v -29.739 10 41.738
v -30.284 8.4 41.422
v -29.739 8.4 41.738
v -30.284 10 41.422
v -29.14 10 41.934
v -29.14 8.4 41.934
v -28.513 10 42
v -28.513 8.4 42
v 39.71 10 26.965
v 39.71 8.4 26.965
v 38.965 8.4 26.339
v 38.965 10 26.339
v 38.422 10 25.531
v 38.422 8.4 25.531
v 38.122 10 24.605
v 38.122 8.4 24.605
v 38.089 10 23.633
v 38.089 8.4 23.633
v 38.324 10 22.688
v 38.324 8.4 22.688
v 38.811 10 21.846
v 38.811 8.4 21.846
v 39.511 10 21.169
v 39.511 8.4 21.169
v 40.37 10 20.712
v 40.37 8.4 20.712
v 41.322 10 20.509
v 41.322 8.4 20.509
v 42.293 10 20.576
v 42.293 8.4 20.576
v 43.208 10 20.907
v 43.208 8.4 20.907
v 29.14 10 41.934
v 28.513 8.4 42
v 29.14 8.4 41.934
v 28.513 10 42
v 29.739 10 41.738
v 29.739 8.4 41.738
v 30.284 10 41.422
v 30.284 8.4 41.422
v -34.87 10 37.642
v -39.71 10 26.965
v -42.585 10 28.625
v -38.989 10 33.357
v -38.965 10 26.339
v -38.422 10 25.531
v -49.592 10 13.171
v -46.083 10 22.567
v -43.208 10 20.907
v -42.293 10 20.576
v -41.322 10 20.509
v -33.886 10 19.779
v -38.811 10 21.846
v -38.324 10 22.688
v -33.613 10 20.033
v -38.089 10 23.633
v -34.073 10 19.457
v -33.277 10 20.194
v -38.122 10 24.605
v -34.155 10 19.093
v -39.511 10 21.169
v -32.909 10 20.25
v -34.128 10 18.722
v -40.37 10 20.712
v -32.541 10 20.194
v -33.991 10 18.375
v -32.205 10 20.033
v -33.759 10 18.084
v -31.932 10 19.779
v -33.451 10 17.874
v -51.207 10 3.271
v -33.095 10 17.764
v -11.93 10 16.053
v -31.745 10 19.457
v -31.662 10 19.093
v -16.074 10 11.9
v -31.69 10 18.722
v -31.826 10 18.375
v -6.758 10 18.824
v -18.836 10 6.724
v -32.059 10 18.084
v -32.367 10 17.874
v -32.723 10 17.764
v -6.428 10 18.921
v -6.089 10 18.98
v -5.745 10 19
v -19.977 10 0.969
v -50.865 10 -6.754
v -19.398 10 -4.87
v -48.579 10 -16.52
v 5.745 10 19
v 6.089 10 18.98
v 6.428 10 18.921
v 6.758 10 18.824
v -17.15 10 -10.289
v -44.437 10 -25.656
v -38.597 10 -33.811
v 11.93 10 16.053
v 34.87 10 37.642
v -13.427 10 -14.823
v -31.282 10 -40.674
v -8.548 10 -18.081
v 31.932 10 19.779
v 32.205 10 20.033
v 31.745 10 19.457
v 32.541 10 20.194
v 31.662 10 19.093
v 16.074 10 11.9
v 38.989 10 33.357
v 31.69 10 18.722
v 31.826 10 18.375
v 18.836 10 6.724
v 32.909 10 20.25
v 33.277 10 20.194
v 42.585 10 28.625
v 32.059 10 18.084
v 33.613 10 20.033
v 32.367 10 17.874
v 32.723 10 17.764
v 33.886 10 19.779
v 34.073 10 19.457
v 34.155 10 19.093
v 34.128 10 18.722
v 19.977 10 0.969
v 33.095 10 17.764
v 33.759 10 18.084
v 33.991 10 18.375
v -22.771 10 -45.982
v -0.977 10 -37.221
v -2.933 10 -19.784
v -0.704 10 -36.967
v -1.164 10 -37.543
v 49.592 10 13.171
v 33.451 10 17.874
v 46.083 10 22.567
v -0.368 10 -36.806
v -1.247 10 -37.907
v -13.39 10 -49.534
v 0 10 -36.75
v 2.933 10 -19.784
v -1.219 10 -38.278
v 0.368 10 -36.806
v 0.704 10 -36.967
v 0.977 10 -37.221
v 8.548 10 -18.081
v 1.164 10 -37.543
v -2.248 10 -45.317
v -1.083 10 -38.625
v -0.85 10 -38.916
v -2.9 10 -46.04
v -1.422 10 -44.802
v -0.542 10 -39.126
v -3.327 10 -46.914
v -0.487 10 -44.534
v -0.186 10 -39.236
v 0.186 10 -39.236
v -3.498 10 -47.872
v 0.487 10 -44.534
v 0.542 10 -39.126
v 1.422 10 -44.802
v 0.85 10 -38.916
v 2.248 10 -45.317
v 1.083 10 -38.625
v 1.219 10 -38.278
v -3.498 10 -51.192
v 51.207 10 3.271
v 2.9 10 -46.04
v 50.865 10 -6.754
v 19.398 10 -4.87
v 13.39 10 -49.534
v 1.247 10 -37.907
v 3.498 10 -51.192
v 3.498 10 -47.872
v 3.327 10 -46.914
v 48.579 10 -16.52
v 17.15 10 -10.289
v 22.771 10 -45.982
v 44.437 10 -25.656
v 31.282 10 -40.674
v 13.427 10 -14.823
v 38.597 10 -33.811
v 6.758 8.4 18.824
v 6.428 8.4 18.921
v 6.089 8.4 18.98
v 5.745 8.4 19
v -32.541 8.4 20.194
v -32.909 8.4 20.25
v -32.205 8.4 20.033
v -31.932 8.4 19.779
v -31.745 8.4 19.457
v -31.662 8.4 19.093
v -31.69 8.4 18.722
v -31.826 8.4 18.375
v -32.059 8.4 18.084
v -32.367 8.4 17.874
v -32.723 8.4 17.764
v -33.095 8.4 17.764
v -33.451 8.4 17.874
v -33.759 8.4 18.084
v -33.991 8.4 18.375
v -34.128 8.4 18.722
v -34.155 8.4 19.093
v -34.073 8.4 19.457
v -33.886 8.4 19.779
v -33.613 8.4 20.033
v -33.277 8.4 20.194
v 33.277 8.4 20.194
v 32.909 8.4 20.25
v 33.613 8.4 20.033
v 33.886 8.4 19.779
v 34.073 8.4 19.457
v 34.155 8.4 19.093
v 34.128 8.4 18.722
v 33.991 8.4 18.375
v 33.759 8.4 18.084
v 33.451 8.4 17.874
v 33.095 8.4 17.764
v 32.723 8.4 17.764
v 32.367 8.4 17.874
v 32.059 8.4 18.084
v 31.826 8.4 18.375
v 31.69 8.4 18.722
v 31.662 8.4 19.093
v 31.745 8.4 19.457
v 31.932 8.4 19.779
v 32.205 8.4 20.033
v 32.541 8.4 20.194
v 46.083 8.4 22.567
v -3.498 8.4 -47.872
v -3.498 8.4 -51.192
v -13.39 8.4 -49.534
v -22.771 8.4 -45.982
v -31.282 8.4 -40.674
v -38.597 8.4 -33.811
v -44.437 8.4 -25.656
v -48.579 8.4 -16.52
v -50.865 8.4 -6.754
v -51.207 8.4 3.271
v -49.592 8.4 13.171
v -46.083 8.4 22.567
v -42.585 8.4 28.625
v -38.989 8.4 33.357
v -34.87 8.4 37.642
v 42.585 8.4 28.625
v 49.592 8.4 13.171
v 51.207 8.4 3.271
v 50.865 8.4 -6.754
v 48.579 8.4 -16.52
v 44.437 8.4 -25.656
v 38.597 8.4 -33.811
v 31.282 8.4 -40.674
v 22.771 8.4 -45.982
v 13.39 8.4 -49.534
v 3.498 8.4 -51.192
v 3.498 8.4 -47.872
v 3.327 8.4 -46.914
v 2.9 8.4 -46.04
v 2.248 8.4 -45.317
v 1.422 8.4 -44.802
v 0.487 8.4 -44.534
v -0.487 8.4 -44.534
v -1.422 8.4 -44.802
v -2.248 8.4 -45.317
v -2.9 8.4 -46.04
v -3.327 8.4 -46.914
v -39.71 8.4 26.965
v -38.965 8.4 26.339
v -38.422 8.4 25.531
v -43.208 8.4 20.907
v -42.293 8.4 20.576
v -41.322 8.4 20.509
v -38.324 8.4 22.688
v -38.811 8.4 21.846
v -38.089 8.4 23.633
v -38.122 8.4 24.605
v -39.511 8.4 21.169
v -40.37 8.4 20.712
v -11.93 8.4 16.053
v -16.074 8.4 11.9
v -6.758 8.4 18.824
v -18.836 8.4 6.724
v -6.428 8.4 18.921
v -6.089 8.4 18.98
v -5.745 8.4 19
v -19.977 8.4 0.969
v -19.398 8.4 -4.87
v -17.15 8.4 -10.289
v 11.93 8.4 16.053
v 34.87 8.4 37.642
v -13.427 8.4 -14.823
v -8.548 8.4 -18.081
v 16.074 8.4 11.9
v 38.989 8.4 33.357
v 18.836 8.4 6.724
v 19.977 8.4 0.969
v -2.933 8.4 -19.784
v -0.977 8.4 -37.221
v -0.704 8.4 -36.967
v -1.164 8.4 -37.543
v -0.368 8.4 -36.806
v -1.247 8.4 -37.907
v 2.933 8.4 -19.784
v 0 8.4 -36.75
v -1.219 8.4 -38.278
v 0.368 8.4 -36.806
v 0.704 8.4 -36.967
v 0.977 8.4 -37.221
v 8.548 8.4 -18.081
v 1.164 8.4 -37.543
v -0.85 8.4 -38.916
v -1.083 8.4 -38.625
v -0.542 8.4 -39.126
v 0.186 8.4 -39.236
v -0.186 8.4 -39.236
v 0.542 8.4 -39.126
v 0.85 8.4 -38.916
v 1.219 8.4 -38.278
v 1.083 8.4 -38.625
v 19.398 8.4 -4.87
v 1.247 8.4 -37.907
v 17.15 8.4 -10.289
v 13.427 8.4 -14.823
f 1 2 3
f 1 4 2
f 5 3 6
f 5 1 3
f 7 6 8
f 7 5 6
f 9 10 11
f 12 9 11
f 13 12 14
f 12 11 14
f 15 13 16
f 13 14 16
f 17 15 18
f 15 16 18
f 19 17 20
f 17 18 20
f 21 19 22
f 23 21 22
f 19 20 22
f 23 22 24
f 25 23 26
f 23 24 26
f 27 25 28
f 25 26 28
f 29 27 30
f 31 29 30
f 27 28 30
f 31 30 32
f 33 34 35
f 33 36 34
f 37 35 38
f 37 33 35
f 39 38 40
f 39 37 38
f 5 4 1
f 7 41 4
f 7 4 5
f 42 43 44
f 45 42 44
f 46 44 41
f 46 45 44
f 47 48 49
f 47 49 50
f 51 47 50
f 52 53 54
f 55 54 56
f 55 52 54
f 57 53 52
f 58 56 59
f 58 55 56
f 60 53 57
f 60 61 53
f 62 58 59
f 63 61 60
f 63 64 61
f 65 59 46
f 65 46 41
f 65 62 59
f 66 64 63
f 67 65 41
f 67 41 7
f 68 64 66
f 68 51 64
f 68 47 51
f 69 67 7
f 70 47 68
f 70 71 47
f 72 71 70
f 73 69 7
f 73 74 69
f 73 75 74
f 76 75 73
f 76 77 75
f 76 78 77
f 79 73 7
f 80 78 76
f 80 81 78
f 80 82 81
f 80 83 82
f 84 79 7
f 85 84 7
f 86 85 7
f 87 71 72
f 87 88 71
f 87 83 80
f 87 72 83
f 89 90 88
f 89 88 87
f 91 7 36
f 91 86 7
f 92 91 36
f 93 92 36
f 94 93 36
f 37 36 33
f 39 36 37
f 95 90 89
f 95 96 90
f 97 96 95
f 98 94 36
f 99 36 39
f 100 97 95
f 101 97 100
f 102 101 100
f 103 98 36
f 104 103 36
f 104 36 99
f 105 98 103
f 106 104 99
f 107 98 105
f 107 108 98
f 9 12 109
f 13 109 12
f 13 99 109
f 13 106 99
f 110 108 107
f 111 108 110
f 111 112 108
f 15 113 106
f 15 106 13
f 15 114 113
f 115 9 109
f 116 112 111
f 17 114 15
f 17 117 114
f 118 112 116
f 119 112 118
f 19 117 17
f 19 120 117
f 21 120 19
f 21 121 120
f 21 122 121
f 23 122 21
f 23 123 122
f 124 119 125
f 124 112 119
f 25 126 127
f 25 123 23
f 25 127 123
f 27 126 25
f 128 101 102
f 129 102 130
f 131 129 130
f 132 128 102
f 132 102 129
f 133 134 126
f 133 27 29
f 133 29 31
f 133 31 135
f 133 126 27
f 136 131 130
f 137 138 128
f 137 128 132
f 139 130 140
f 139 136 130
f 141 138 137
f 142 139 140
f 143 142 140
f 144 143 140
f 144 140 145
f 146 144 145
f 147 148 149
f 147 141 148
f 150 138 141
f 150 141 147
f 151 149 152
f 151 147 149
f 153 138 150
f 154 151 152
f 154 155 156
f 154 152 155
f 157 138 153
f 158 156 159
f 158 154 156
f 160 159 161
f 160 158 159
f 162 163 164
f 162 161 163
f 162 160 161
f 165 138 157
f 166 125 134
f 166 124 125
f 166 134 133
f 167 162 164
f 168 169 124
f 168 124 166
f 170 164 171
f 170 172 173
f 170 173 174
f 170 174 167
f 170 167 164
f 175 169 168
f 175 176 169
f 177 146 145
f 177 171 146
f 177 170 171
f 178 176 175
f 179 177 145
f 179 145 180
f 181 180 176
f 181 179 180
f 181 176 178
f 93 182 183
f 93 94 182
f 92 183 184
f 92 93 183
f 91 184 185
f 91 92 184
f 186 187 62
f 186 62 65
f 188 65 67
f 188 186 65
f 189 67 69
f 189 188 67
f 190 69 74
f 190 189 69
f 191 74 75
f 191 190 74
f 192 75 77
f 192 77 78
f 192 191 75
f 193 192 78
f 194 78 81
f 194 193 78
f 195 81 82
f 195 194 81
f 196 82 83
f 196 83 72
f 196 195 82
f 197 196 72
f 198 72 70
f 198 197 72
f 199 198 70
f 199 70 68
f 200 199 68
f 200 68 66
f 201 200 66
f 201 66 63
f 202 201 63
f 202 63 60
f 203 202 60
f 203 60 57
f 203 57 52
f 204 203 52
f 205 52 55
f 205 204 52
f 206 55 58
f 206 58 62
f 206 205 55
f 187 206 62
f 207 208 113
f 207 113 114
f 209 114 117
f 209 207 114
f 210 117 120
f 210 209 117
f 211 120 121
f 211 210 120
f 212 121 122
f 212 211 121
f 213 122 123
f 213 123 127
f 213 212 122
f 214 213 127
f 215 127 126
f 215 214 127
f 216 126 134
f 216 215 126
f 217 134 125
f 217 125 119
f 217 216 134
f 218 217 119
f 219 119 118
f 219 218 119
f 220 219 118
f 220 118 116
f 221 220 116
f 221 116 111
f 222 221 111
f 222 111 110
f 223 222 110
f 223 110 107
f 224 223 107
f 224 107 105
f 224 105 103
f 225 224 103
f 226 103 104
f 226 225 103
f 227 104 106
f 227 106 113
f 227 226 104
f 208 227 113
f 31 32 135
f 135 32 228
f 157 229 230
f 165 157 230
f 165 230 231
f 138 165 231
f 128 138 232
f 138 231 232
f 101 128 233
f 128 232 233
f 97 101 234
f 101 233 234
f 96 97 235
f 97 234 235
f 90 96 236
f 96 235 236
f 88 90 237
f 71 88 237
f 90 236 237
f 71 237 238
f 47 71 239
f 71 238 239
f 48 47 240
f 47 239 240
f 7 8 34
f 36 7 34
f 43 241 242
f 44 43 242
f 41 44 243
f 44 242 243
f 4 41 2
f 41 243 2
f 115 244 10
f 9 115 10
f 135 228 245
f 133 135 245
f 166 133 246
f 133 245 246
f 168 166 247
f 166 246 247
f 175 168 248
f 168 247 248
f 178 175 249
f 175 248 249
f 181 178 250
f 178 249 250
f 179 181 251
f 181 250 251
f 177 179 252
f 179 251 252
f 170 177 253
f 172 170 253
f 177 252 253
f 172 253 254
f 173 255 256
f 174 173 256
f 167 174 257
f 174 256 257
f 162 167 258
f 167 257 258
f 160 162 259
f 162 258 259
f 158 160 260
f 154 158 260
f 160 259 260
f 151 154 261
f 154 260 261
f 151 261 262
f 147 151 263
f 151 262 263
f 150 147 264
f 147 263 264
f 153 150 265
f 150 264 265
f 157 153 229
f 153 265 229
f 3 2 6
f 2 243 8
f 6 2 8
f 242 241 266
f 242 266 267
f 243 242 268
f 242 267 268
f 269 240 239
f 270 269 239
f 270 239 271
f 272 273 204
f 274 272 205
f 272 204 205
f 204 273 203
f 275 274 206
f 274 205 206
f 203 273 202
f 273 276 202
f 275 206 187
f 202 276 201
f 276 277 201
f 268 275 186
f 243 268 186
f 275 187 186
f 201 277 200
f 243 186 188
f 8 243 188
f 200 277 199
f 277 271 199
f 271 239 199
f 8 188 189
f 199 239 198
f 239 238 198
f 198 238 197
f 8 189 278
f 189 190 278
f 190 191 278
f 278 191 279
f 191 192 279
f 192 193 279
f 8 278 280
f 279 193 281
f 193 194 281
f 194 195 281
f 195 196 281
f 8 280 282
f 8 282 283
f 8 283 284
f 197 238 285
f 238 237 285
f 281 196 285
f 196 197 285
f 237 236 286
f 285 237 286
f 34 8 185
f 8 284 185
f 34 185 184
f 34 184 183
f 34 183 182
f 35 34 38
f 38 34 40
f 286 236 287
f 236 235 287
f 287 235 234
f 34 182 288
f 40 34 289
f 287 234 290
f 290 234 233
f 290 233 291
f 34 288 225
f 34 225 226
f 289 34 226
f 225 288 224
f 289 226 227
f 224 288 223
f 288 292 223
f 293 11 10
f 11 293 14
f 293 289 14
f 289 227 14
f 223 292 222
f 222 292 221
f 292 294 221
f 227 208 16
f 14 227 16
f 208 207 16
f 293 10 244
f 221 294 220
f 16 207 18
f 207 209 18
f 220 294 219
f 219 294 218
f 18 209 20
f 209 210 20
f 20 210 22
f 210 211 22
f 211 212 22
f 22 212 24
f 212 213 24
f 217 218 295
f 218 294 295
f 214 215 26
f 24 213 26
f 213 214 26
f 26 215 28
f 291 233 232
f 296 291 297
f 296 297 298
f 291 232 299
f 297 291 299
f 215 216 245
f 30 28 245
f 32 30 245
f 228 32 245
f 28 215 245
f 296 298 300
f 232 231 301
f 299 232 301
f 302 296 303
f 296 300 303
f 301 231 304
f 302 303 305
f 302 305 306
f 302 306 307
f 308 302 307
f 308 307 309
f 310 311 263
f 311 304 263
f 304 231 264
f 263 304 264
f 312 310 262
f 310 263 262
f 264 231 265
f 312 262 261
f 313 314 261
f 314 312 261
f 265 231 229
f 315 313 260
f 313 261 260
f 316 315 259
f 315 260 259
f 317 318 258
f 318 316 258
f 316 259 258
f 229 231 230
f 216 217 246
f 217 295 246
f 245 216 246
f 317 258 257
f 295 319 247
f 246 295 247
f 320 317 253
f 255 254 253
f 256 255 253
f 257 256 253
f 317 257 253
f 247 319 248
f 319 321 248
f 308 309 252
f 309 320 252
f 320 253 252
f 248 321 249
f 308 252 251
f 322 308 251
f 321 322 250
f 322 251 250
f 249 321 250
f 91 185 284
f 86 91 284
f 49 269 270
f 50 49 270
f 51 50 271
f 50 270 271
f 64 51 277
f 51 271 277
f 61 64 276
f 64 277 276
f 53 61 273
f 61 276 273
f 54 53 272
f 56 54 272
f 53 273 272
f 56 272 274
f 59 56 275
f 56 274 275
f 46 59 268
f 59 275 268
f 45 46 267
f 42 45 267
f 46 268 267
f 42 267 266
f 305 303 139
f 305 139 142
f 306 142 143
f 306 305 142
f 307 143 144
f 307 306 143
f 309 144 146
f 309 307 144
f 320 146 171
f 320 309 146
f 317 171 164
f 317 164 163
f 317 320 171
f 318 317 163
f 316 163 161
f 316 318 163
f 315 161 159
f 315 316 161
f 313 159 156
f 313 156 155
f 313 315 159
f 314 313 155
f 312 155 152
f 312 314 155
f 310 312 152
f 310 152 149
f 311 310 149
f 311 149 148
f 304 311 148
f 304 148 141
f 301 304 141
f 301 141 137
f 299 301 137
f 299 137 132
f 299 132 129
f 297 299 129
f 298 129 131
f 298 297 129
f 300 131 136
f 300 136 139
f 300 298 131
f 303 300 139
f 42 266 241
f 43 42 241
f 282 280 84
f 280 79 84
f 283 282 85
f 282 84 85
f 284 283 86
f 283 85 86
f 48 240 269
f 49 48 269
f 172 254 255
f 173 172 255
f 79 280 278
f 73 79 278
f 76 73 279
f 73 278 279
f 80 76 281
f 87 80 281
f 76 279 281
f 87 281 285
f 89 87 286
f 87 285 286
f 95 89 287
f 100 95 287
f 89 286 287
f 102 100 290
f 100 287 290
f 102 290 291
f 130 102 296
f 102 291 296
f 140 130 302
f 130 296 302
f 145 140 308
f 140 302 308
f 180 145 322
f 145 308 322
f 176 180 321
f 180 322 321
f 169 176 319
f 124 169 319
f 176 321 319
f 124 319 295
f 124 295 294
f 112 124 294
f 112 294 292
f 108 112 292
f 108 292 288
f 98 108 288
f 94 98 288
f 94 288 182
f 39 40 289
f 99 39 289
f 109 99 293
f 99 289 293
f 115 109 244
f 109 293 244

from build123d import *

# Parameters (mm, degrees)
SKETCH_1_R      = 1.25
EXTRUDE_1_DEPTH = 1.6
FILLET_1_R      = 3


with BuildPart() as part:
    # 草图1 → 凸台-拉伸1 (new body)
    with BuildSketch(Plane(origin=(0, 8.4, 0), x_dir=(1, 0, 0), z_dir=(0, 1, 0))):
        with BuildLine():
            ThreePointArc((-42.584930161, -28.625185914), (-36.646174274, -35.915671462), (-29.47672888, -42))
            Line((-29.47672888, -42), (29.47672888, -42))
            ThreePointArc((29.47672888, -42), (36.646174274, -35.915671462), (42.584930161, -28.625185914))
            Line((42.584930161, -28.625185914), (39.709874377, -26.965271683))
            ThreePointArc((39.709874377, -26.965271683), (38.538130468, -22.25), (43.207547486, -20.90712415))
            Line((43.207547486, -20.90712415), (46.08260327, -22.567038381))
            ThreePointArc((46.08260327, -22.567038381), (44.43712591, 25.655786606), (3.497673109, 51.192224295))
            Line((3.497673109, 51.192224295), (3.497673109, 47.872395833))
            ThreePointArc((3.497673109, 47.872395833), (0, 44.5), (-3.497673109, 47.872395833))
            Line((-3.497673109, 47.872395833), (-3.497673109, 51.192224295))
            ThreePointArc((-3.497673109, 51.192224295), (-44.43712591, 25.655786606), (-46.08260327, -22.567038381))
            Line((-46.08260327, -22.567038381), (-43.207547486, -20.90712415))
            ThreePointArc((-43.207547486, -20.90712415), (-38.538130468, -22.25), (-39.709874377, -26.965271683))
            Line((-39.709874377, -26.965271683), (-42.584930161, -28.625185914))
        make_face()
        with Locations(Location((-32.908965344, -19, 0), (0, 0, 270))):
            Circle(SKETCH_1_R, mode=Mode.SUBTRACT)
        with Locations(Location((32.908965344, -19, 0), (0, 0, 270))):
            Circle(SKETCH_1_R, mode=Mode.SUBTRACT)
        with BuildLine():
            Line((6.244997998, -19), (-6.244997998, -19))
            ThreePointArc((-6.244997998, -19), (0, 20), (6.244997998, -19))
        make_face(mode=Mode.SUBTRACT)
        with Locations(Location((0, 38, 0), (0, 0, 270))):
            Circle(SKETCH_1_R, mode=Mode.SUBTRACT)
    extrude(amount=EXTRUDE_1_DEPTH)

    # 圆角1
    fillet_1_edges = [part.edges().sort_by_distance(p)[0] for p in [
        (-29.47672888, 9.2, 42),
        (29.47672888, 9.2, 42),
        (-6.244997998, 9.2, 19),
        (6.244997998, 9.2, 19),
    ]]
    fillet(fillet_1_edges, radius=FILLET_1_R)


solid = part.part
